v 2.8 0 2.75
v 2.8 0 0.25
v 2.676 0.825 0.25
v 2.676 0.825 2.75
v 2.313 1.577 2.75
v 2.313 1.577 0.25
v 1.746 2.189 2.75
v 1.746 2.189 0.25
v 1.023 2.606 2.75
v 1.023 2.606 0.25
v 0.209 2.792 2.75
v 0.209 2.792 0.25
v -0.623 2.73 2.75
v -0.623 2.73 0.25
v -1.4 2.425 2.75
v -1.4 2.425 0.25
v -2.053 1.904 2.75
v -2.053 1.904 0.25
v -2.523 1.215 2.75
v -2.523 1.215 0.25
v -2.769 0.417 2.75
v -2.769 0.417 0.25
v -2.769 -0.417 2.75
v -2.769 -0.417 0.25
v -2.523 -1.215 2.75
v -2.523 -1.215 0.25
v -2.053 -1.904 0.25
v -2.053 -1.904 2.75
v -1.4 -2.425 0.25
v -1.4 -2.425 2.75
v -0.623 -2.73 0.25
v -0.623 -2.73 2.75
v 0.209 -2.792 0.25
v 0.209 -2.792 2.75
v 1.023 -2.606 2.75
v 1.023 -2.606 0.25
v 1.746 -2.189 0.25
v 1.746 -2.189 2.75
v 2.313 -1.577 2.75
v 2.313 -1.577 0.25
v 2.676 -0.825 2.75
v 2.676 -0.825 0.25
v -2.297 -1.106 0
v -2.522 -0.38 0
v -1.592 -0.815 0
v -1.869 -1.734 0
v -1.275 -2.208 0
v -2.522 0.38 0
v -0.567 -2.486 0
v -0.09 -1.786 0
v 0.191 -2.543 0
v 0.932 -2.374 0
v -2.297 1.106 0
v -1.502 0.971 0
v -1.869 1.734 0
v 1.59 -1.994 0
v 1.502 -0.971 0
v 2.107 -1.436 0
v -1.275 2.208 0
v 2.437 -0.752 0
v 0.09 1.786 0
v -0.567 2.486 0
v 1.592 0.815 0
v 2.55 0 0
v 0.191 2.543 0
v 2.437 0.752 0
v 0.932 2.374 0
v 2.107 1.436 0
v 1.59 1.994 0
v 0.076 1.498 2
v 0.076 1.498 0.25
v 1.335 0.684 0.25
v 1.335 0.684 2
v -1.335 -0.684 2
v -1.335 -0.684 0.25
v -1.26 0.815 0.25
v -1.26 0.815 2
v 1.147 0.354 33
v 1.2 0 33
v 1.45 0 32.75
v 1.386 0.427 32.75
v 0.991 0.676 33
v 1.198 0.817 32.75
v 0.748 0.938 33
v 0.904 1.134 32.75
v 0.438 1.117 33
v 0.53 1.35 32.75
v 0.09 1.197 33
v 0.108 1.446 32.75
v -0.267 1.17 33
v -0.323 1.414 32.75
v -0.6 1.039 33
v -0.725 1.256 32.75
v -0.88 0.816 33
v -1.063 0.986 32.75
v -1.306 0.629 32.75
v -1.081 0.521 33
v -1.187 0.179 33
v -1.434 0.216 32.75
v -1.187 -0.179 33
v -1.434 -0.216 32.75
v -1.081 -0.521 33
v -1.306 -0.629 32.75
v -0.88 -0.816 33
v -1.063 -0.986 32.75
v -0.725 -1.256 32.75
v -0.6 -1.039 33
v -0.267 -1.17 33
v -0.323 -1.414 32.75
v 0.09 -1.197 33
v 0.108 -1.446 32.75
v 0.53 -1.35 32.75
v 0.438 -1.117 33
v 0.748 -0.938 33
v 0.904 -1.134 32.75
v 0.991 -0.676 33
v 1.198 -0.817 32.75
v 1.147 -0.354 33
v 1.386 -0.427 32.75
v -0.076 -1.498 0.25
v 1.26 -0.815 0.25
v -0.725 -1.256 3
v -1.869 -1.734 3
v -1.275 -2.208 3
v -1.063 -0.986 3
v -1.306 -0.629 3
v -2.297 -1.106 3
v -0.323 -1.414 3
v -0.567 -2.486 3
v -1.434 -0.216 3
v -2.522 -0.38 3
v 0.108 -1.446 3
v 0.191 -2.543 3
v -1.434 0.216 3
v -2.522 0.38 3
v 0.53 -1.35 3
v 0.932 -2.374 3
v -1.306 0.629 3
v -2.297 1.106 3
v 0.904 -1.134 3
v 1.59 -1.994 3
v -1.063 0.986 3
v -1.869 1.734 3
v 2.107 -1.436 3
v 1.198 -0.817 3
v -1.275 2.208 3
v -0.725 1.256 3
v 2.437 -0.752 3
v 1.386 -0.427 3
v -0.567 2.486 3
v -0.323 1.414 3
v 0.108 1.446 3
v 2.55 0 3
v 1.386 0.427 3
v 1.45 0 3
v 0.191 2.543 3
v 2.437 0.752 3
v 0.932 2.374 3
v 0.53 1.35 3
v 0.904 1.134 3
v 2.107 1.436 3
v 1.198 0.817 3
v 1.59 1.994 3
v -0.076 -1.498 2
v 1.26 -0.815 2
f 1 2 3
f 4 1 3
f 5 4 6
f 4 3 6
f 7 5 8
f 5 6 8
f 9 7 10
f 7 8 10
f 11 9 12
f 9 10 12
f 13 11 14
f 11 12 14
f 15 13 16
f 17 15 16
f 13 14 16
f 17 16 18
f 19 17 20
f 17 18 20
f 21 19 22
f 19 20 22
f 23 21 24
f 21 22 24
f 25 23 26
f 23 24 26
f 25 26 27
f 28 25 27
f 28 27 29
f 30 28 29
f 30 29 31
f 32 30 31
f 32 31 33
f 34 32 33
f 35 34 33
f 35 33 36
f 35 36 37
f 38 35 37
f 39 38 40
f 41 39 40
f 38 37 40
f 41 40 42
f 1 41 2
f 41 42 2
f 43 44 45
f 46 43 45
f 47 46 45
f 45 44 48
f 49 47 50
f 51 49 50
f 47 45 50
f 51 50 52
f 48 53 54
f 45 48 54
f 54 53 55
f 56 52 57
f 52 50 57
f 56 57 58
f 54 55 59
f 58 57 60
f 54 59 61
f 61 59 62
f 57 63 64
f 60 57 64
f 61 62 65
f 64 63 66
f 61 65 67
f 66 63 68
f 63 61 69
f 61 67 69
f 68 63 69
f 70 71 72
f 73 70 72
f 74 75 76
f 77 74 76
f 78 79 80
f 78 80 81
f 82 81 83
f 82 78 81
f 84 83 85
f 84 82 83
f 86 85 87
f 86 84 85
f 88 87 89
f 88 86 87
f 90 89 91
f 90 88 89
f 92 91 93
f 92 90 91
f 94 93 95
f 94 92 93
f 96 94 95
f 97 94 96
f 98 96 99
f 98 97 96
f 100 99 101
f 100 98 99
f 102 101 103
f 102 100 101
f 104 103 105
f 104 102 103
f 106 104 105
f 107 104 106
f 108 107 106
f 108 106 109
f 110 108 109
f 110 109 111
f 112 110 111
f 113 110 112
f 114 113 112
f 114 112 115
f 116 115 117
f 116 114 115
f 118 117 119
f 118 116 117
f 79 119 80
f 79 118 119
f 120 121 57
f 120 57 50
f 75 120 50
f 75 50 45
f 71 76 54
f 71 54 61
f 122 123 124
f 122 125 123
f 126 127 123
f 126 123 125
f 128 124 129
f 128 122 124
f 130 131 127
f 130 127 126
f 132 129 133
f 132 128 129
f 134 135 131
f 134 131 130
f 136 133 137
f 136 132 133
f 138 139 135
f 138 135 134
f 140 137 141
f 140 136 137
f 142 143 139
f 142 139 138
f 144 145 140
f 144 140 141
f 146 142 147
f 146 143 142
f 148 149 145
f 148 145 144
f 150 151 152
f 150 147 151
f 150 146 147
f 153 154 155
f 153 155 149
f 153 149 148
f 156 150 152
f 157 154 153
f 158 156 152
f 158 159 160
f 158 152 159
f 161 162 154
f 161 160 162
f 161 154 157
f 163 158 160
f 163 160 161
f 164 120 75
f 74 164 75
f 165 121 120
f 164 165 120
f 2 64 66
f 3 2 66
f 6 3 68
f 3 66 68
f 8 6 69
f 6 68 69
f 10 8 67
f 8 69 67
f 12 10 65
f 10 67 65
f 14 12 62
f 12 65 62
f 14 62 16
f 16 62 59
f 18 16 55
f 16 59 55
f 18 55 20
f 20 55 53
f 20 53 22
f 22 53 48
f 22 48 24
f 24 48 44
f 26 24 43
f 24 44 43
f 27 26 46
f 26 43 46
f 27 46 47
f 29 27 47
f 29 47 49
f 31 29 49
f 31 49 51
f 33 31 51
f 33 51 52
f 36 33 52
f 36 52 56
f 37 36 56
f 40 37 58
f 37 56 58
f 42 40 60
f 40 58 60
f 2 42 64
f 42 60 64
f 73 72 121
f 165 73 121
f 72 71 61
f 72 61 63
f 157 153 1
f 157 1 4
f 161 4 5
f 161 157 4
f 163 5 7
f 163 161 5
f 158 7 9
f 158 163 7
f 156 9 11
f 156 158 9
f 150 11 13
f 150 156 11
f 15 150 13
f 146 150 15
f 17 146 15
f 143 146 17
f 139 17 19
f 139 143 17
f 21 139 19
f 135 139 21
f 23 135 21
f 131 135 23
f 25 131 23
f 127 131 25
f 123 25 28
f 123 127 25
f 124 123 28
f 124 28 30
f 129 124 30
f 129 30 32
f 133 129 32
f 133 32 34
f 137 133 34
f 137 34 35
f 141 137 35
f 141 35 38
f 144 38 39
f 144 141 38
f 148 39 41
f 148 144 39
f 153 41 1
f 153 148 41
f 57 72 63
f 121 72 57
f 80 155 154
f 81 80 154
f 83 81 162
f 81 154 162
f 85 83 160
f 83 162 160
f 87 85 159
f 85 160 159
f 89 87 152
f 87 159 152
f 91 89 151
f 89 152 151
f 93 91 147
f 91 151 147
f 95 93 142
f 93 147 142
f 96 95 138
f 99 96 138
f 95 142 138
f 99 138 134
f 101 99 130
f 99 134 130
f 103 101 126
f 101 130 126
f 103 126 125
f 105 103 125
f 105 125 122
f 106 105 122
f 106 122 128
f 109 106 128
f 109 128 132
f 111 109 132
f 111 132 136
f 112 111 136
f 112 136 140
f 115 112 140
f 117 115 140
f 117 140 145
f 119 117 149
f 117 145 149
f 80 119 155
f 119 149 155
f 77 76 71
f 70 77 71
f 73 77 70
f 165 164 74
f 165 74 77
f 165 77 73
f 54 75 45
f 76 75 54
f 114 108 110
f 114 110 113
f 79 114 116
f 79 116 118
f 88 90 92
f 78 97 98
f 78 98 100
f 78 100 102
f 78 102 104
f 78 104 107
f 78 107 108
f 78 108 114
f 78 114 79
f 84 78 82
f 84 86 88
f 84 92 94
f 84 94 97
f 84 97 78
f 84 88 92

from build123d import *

# Parameters (mm, degrees)
SKETCH_R     = 2.8
PAD_DEPTH    = 3
SKETCH001_R  = 1.45
PAD001_DEPTH = 30
POCKET_DEPTH = 2
CHAMFER_SIZE = 0.25


with BuildPart() as part:
    # Sketch → Pad (new body)
    with BuildSketch(Plane.XY):
        Circle(SKETCH_R)
    extrude(amount=PAD_DEPTH)

    # Sketch001 (on Face3 of Pad) → Pad001 (join)
    with BuildSketch(Plane.XY.offset(3)):
        Circle(SKETCH001_R)
    extrude(amount=PAD001_DEPTH)

    # Sketch002 (on Face2 of Pad001) → Pocket (cut)
    with BuildSketch(Plane(origin=(0, 0, 0), x_dir=(1, 0, 0), z_dir=(0, 0, -1))):
        Polygon((1.259542, 0.814588), (-0.075682, 1.49809), (-1.335225, 0.683502), (-1.259542, -0.814588), (0.075682, -1.49809), (1.335225, -0.683502), align=None)
    extrude(amount=-POCKET_DEPTH, mode=Mode.SUBTRACT)

    # Chamfer
    chamfer_edges = [part.edges().sort_by_distance(p)[0] for p in [
        (-2.8, 0, 3),
        (-2.8, 0, 0),
        (1.297384, -0.065543, 0),
        (0.705454, 1.090796, 0),
        (-0.59193, 1.156339, 0),
        (-1.297384, 0.065543, 0),
        (-0.705454, -1.090796, 0),
        (0.59193, -1.156339, 0),
        (-1.45, 0, 33),
    ]]
    chamfer(chamfer_edges, length=CHAMFER_SIZE)


solid = part.part
